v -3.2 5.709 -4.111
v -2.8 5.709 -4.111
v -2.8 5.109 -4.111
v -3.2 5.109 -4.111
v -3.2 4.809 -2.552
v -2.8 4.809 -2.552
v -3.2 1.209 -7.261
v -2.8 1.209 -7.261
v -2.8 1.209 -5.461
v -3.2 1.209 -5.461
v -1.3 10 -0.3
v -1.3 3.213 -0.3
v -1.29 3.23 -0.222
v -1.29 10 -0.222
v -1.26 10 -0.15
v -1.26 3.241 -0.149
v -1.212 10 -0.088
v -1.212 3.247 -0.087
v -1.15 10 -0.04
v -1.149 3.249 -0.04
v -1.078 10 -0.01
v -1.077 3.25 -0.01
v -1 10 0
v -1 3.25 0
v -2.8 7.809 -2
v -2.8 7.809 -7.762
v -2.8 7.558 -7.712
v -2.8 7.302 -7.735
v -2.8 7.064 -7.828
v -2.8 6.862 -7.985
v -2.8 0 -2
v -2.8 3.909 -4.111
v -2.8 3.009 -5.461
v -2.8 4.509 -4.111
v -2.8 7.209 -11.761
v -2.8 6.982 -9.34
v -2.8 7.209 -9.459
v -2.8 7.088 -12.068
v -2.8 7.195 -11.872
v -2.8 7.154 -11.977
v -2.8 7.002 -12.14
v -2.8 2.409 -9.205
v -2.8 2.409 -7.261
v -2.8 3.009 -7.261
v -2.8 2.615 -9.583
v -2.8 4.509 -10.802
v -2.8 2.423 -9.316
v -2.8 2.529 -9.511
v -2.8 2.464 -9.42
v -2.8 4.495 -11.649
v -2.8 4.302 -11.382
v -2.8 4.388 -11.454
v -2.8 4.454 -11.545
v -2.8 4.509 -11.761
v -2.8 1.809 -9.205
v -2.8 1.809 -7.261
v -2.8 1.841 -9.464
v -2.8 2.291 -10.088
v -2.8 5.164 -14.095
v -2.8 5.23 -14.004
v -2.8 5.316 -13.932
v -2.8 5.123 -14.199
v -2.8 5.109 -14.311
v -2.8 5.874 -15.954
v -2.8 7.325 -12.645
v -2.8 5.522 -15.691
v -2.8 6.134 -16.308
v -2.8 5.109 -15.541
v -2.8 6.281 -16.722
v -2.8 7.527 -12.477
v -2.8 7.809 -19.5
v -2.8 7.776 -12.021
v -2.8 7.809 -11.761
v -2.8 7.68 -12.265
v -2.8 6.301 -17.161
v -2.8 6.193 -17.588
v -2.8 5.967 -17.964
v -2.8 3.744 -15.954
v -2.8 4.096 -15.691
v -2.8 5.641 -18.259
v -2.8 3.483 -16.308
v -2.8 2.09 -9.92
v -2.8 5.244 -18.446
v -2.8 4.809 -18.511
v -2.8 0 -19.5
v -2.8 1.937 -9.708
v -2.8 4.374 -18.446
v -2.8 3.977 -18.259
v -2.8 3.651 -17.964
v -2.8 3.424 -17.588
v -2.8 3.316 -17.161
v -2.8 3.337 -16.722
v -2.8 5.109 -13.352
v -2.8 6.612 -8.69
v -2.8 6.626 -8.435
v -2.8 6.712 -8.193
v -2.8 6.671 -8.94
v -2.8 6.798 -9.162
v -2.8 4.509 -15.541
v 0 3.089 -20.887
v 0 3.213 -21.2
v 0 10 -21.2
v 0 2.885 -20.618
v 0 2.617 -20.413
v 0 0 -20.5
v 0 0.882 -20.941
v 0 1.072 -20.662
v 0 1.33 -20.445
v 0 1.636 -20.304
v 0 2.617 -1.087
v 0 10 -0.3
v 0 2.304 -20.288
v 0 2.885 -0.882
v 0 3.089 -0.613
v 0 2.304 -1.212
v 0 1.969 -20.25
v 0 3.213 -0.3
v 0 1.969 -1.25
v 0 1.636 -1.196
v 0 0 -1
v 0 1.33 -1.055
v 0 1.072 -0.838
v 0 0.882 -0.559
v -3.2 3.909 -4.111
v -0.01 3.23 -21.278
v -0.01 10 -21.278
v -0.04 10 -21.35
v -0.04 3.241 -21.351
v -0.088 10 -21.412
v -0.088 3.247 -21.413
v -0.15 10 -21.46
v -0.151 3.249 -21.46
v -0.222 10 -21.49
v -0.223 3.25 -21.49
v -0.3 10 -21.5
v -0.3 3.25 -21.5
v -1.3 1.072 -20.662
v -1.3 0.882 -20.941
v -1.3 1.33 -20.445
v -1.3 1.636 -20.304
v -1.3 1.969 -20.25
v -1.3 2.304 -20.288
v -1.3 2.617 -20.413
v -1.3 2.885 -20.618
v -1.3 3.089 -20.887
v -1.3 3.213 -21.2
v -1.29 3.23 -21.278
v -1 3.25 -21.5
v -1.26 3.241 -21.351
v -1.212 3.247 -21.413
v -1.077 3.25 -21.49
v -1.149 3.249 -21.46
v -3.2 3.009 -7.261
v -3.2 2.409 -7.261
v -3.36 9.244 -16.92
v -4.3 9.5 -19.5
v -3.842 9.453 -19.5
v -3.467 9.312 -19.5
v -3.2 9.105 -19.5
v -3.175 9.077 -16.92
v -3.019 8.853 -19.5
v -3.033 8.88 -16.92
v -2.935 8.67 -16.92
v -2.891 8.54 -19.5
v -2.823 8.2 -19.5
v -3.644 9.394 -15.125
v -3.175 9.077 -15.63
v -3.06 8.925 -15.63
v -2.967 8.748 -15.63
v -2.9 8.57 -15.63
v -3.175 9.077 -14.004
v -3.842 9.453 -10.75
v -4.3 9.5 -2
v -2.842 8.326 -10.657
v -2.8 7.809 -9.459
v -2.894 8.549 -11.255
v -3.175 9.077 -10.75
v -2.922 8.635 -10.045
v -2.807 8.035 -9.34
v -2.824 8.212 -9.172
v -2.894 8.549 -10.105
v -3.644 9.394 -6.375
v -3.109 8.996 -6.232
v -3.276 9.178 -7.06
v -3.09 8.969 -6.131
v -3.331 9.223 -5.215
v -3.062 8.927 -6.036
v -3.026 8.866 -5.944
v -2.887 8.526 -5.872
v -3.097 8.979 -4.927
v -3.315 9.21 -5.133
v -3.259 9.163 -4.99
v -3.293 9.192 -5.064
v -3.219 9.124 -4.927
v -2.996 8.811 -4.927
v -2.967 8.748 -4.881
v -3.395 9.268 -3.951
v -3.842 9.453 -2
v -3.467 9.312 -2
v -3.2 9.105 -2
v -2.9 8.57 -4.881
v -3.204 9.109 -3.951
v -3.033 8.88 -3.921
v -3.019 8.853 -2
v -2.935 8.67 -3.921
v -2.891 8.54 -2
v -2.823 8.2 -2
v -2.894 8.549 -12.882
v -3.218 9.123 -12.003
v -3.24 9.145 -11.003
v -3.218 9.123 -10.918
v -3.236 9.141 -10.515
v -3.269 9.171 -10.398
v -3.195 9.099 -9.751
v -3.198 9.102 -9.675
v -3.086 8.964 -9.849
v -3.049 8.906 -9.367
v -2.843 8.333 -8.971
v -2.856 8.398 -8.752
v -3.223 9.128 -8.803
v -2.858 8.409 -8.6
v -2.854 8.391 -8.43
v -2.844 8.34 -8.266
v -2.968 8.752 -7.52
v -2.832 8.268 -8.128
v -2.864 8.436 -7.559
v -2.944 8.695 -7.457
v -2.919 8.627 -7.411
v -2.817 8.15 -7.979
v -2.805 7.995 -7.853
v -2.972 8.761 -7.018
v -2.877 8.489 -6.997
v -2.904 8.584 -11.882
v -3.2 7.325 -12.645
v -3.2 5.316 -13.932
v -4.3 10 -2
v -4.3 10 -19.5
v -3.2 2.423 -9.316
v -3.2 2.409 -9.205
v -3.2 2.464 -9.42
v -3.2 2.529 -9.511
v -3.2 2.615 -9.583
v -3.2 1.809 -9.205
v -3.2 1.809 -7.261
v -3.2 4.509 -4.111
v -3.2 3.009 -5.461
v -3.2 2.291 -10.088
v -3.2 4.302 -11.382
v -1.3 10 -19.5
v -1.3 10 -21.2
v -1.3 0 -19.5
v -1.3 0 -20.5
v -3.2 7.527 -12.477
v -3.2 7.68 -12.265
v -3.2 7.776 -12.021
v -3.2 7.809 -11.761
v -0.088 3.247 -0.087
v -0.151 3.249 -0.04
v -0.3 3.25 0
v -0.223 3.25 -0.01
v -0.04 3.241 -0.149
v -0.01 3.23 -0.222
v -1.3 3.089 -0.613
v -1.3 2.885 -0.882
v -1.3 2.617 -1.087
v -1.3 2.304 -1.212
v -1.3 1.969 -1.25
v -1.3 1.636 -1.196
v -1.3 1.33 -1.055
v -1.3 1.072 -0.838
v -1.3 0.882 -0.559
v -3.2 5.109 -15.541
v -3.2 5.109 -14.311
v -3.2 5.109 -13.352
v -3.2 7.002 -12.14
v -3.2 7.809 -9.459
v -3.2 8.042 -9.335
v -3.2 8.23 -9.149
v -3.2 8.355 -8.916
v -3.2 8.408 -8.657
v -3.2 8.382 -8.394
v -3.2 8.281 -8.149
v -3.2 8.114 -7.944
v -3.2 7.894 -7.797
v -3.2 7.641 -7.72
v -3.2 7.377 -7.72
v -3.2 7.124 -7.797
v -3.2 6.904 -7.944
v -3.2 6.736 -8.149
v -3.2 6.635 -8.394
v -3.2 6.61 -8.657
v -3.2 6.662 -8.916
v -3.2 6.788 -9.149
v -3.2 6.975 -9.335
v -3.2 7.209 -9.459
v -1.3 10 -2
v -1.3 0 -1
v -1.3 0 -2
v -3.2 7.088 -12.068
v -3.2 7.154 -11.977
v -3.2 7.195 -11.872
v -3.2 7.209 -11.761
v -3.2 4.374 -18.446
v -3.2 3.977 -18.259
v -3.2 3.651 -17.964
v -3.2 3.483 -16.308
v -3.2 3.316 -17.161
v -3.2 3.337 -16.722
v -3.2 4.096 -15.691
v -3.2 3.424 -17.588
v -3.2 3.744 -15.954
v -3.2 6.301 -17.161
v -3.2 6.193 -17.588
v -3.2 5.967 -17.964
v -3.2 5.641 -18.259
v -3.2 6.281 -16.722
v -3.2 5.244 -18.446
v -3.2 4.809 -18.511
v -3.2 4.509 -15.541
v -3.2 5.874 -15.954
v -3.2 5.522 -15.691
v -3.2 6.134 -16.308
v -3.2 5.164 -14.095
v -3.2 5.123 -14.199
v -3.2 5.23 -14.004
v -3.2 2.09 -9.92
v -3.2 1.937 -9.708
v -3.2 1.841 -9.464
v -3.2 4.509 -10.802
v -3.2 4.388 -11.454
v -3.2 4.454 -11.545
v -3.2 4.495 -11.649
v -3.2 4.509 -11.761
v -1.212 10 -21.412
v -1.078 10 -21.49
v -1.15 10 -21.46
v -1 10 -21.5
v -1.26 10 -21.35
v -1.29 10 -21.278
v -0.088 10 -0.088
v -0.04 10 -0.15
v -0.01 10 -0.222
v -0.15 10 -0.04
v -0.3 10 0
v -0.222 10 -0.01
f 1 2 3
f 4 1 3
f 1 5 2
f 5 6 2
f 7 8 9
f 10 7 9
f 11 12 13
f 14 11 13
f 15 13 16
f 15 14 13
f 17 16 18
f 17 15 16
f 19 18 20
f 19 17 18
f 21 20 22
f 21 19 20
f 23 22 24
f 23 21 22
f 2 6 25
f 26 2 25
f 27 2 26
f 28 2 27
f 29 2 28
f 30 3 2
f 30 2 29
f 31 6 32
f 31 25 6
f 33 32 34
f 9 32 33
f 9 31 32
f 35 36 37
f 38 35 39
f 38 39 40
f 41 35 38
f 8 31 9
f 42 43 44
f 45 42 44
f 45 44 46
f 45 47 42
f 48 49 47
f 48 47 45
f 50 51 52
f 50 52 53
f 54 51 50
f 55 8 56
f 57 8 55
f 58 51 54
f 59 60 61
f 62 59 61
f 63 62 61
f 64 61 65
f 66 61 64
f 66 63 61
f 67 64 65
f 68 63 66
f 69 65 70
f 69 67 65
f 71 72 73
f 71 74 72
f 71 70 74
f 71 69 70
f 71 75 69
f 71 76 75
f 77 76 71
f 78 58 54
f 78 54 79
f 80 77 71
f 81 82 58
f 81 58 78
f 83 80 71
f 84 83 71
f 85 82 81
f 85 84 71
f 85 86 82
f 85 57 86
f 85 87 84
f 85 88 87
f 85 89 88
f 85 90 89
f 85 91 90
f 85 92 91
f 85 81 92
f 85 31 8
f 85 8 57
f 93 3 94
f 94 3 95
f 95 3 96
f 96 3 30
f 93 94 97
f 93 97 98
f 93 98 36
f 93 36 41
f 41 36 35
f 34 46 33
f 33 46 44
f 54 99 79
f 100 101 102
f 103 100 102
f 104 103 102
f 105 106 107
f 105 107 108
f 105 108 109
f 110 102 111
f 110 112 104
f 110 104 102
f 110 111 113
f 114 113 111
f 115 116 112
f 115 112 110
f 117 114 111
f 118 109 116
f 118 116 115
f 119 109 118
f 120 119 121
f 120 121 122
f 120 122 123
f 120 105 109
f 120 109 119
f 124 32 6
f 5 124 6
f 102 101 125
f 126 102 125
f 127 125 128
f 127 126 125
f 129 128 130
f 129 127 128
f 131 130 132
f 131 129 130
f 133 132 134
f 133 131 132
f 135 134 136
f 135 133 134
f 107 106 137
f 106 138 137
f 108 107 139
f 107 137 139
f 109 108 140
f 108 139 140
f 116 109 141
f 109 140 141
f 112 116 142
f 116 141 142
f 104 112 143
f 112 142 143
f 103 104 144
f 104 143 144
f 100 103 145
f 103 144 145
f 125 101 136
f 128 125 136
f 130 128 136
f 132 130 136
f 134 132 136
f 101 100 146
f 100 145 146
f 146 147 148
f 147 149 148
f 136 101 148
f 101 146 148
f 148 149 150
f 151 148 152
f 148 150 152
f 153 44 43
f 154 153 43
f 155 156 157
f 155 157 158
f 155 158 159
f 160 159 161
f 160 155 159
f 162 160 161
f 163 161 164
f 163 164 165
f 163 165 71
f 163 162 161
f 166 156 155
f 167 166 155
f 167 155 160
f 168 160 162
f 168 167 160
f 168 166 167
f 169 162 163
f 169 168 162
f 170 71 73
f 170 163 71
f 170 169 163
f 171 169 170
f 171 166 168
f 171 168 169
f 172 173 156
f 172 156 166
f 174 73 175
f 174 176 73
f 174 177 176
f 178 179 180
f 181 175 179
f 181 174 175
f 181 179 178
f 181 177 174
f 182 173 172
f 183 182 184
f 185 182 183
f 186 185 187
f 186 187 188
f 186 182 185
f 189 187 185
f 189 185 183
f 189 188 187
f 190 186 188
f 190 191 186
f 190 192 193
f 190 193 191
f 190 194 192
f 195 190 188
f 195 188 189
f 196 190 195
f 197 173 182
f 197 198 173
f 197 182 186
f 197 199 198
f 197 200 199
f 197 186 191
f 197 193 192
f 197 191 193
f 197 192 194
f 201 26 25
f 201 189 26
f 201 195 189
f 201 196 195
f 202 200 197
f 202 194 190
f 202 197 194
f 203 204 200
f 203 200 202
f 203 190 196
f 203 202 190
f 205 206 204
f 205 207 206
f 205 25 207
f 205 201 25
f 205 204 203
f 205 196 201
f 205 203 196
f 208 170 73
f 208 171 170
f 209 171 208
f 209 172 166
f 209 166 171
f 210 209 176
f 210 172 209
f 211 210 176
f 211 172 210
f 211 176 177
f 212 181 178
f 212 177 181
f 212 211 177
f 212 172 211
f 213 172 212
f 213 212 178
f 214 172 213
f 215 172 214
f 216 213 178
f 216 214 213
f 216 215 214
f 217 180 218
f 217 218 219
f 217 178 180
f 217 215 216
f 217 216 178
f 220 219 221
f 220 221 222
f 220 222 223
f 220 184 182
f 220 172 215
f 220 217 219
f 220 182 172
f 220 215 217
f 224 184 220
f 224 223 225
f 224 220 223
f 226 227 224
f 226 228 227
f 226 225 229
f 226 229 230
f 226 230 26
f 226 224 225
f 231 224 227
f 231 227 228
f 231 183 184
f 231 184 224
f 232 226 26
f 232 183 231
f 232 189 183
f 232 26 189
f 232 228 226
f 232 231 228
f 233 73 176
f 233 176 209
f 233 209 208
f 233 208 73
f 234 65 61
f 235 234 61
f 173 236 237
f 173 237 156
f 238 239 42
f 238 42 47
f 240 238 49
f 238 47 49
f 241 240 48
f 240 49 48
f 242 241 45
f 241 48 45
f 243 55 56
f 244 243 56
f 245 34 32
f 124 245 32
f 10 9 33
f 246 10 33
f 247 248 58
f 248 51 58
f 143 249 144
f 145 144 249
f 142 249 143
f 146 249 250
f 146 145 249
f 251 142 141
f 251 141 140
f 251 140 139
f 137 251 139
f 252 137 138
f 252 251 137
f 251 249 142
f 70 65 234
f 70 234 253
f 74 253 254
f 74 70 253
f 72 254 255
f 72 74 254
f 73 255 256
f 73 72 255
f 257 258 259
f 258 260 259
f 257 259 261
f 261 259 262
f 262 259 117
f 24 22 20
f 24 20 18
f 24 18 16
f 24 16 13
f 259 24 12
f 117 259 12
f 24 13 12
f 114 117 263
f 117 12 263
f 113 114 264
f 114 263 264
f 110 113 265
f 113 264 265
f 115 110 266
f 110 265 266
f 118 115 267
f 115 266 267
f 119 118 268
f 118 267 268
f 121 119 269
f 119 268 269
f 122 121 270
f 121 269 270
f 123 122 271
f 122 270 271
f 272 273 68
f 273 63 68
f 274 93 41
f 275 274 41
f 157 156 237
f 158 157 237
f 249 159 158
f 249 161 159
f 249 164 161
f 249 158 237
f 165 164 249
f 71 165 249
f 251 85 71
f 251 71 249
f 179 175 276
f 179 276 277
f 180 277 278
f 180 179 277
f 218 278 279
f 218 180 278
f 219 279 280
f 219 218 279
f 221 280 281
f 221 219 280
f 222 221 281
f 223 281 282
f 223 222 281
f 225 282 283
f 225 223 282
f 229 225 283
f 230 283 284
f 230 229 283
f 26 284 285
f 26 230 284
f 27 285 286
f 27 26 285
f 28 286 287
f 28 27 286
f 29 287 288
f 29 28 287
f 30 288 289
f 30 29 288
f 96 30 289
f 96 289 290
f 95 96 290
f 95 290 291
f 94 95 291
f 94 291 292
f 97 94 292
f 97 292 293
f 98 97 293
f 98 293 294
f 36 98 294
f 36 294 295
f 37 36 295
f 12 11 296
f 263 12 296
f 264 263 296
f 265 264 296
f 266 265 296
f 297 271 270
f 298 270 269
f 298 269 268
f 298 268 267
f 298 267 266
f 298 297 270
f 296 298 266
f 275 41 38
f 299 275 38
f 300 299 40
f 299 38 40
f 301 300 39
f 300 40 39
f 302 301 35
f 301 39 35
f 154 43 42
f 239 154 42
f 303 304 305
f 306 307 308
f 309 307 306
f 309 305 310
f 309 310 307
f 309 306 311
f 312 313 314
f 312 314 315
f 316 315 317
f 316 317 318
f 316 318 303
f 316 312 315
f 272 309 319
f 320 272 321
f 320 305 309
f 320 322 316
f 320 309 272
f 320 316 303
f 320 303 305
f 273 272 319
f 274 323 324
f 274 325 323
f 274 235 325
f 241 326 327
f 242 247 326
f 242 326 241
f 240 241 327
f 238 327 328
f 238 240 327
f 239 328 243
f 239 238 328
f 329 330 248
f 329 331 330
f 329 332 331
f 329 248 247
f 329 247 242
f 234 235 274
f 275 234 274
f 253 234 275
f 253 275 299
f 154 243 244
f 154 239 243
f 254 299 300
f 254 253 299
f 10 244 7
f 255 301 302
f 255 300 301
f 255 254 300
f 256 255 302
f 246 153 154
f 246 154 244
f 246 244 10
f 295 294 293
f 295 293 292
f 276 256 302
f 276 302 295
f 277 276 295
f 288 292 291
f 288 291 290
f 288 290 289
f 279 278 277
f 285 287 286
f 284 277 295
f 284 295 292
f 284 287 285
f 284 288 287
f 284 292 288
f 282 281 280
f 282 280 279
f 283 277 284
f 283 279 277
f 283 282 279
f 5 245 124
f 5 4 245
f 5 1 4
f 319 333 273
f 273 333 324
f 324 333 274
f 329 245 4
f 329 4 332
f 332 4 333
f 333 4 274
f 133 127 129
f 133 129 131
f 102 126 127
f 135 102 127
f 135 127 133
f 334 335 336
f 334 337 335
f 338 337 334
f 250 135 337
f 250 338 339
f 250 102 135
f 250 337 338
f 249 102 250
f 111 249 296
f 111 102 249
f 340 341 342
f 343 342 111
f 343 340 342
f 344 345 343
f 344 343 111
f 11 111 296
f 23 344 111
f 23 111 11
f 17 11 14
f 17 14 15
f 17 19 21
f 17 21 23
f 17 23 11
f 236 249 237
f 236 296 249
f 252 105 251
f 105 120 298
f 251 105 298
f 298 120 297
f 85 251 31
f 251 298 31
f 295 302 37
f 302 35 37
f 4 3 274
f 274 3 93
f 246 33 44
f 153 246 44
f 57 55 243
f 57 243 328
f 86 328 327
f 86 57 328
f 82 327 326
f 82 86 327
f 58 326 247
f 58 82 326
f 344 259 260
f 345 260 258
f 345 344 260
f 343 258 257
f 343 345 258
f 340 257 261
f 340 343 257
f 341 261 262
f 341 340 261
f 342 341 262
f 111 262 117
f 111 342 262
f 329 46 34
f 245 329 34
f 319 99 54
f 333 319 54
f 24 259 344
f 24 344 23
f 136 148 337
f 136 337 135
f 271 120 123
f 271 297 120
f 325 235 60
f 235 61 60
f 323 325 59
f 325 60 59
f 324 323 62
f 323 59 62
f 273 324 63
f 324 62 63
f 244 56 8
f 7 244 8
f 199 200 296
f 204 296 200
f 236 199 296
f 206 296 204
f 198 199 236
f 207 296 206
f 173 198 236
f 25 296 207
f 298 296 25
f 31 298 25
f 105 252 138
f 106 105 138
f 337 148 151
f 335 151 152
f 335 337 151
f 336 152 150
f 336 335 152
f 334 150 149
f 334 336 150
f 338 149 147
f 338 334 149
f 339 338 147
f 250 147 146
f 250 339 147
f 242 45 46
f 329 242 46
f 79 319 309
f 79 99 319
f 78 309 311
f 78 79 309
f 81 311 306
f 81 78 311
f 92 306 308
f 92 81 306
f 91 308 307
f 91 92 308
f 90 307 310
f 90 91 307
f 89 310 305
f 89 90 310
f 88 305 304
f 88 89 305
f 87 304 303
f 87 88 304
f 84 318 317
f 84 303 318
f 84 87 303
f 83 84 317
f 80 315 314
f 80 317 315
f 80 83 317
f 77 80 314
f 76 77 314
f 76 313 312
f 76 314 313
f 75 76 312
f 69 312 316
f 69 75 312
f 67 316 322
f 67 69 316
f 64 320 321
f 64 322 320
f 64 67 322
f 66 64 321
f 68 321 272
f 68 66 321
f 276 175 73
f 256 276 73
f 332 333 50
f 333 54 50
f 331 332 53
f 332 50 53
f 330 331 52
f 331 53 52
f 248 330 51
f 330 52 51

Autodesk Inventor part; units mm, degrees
ref_plane "YZ Plane" through (0, 0, 0) normal (1, 0, 0) x (0, 1, 0)
ref_plane "XZ Plane" through (0, 0, 0) normal (0, 1, 0) x (-1, 0, 0)
ref_plane "XY Plane" through (0, 0, 0) normal (0, 0, 1) x (1, 0, 0)
sketch "Skizze1" plane through (0, 0, 0) normal (0, 1, 0) x (-1, 0, 0)
  line L0 (0, 0) -> (1.3, 0)
  line L1 (1.3, 0) -> (1.3, -21.5)
  line L2 (1.3, -21.5) -> (0, -21.5)
  line L3 (0, -21.5) -> (0, 0)
  line L4 (1.3, 0) -> (2.8, 0)
  line L5 (2.8, 0) -> (2.8, -21.5)
  line L6 (2.8, -21.5) -> (1.3, -21.5)
  line L7 (1.3, -21.5) -> (1.3, 0)
  line L8 (2.8, 0) -> (1.3, 0)
  line L9 (1.3, 0) -> (1.3, -2)
  line L10 (1.3, -2) -> (2.8, -2)
  line L11 (2.8, -2) -> (2.8, 0)
  line L12 (1.3, -21.5) -> (2.8, -21.5)
  line L13 (2.8, -21.5) -> (2.8, -19.5)
  line L14 (2.8, -19.5) -> (1.3, -19.5)
  line L15 (1.3, -19.5) -> (1.3, -21.5)
  point P0 (1.3, -19.5)
  point P1 (2.8, -2)
  point P2 (1.3, -2)
  dimension "d0" = 1.3
  dimension "d1" = 21.5
  dimension "d2" = 1.5
  dimension "d3" = 2
  dimension "d4" = 2
extrude "Extrusion1" add sketch "Skizze1" along normal blind 10 contours L0 L1 L2 L3 | L10 L5 L14 L1
sketch "Skizze3" plane through (-2.8, 0, -19.5) normal (-1, 0, 0) x (0, 0, 1)
  line L0 (12.2393, 3.0088) -> (12.2393, 2.4088)
  line L1 (12.2393, 2.4088) -> (10.2953, 2.4088)
  arc A0 (9.9169, 2.6153) -> (10.2953, 2.4088) centre (10.2953, 2.8588) ccw
  line L2 (9.9169, 2.6153) -> (8.6983, 4.5088)
  line L3 (8.6983, 4.5088) -> (15.3893, 4.5088)
  line L4 (15.3893, 4.5088) -> (15.3893, 3.9088)
  line L5 (15.3893, 3.9088) -> (16.9481, 4.8088)
  line L6 (16.9481, 4.8088) -> (15.3893, 5.7088)
  line L7 (15.3893, 5.7088) -> (15.3893, 5.1088)
  line L8 (15.3893, 5.1088) -> (6.148, 5.1088)
  line L9 (6.148, 5.1088) -> (7.3604, 7.0016)
  arc A1 (7.7393, 7.2088) -> (7.3604, 7.0016) centre (7.7393, 6.7588) ccw
  line L10 (7.7393, 7.2088) -> (10.0408, 7.2088)
  arc A2 (10.0408, 7.2088) -> (10.0408, 7.8088) centre (10.8893, 7.5088) ccw
  line L11 (10.0408, 7.8088) -> (7.7393, 7.8088)
  arc A3 (7.7393, 7.8088) -> (6.8551, 7.3252) centre (7.7393, 6.7588) ccw
  line L12 (6.8551, 7.3252) -> (5.5682, 5.3161)
  arc A4 (5.1893, 5.1088) -> (5.5682, 5.3161) centre (5.1893, 5.5588) ccw
  line L13 (5.1893, 5.1088) -> (3.959, 5.1088)
  arc A5 (3.959, 5.1088) -> (3.959, 4.5088) centre (2.4893, 4.8088) ccw
  line L14 (3.959, 4.5088) -> (7.7393, 4.5088)
  arc A6 (8.1177, 4.3024) -> (7.7393, 4.5088) centre (7.7393, 4.0588) ccw
  line L15 (8.1177, 4.3024) -> (9.4123, 2.2906)
  arc A7 (9.4123, 2.2906) -> (10.2953, 1.8088) centre (10.2953, 2.8588) ccw
  line L16 (10.2953, 1.8088) -> (12.2393, 1.8088)
  line L17 (12.2393, 1.8088) -> (12.2393, 1.2088)
  line L18 (12.2393, 1.2088) -> (14.0393, 1.2088)
  line L19 (14.0393, 1.2088) -> (14.0393, 3.0088)
  line L20 (14.0393, 3.0088) -> (12.2393, 3.0088)
  point P0 (19.5, 0)
  point P1 (8.1177, 4.3024)
  point P2 (9.4123, 2.2906)
  point P3 (10.2953, 1.8088)
  point P4 (9.9169, 2.6153)
  point P5 (6.148, 5.1088)
  point P6 (7.3604, 7.0016)
  point P7 (7.7393, 7.2088)
  point P8 (10.0408, 7.8088)
  point P9 (7.7393, 7.8088)
  point P10 (6.8551, 7.3252)
  point P11 (5.1893, 5.1088)
  point P12 (3.959, 5.1088)
  point P13 (3.959, 4.5088)
  point P14 (7.7393, 4.5088)
extrude "Extrusion2" add sketch "Skizze3" along normal blind 0.4
sketch "Skizze4" plane through (-2.8, 0, -2) normal (0, 0, 1) x (1, 0, 0)
  line L0 (1.5, 10) -> (0, 10) projected
  line L1 (0, 10) -> (-1.5, 10)
  line L2 (0, 10) -> (-1.5, 10)
  line L3 (-1.5, 10) -> (-1.5, 9.5)
  line L4 (-1.5, 9.5) -> (0, 9.5)
  line L5 (0, 9.5) -> (0, 10)
  line L6 (0, 9.5) -> (0, 8)
  line L7 (0, 7.8088) -> (-0.4, 7.8088) projected
  line L8 (-1.5, 9.5) -> (0, 9.5) construction
  line L9 (0, 9.5) -> (0, 7.8088) construction
  line L10 (0, 0) -> (0, 10) projected
  spline S0 degree 2 poles (-1.5, 9.5) (0, 9.5) (0, 7.8088) knots 1 1 1 2 2 2
  point P0 (2.8, 0)
  dimension "d9" = 1.5
  dimension "d10" = 0.5
  dimension "d11" = 1.5
extrude "Extrusion3" add sketch "Skizze4" against normal up to surface (17.5 mm away)
sketch "Skizze5" plane through (-1.3, 0, -2) normal (-1, 0, 0) x (0, 0, 1)
  line L0 (0, 10) -> (2, 10) projected
  line L1 (2, 10) -> (2, 2)
  line L2 (2, 0) -> (2, 10) projected
  line L3 (2, 2) -> (-19.5, 2)
  line L4 (-19.5, 0) -> (-19.5, 10) projected
  circle A0 centre (2, 2) radius 1.25
  circle A1 centre (-19.5, 2) radius 1.25
  line L5 (2, 0) -> (-19.5, 0) projected
  line L6 (1, 0) -> (2, 2)
  line L7 (-19.5, 0) -> (-17.5, 0) projected
  line L8 (-18.5, 0) -> (-19.5, 2)
  point P0 (1.441, 0.882)
  point P1 (2, 0.75)
  point P2 (-18.5, 0)
  point P3 (-18.941, 0.882)
  point P4 (-19.5, 0.75)
  dimension "d14" = 8
  dimension "d15" = 2.5
  dimension "d16" = 2.5
extrude "Extrusion4" cut sketch "Skizze5" against normal up to surface (1.3 mm away) contours A0 L2 L1 | L1 L3 A0 | L6 A0 L3 | L2 A0 L6 | L2 L5 L6 A0 | A1 L8 L3 | L3 L4 A1 | L8 A1 L4 | L4 A1 | L8 L5 L4 A1
fillet "Rundung1" radius 0.3 4 edges at (-1.3, 6.625, 0) (-1.3, 6.625, -21.5) (0, 6.625, -21.5) (0, 6.625, 0)
properties part number "USB-Deckel"
